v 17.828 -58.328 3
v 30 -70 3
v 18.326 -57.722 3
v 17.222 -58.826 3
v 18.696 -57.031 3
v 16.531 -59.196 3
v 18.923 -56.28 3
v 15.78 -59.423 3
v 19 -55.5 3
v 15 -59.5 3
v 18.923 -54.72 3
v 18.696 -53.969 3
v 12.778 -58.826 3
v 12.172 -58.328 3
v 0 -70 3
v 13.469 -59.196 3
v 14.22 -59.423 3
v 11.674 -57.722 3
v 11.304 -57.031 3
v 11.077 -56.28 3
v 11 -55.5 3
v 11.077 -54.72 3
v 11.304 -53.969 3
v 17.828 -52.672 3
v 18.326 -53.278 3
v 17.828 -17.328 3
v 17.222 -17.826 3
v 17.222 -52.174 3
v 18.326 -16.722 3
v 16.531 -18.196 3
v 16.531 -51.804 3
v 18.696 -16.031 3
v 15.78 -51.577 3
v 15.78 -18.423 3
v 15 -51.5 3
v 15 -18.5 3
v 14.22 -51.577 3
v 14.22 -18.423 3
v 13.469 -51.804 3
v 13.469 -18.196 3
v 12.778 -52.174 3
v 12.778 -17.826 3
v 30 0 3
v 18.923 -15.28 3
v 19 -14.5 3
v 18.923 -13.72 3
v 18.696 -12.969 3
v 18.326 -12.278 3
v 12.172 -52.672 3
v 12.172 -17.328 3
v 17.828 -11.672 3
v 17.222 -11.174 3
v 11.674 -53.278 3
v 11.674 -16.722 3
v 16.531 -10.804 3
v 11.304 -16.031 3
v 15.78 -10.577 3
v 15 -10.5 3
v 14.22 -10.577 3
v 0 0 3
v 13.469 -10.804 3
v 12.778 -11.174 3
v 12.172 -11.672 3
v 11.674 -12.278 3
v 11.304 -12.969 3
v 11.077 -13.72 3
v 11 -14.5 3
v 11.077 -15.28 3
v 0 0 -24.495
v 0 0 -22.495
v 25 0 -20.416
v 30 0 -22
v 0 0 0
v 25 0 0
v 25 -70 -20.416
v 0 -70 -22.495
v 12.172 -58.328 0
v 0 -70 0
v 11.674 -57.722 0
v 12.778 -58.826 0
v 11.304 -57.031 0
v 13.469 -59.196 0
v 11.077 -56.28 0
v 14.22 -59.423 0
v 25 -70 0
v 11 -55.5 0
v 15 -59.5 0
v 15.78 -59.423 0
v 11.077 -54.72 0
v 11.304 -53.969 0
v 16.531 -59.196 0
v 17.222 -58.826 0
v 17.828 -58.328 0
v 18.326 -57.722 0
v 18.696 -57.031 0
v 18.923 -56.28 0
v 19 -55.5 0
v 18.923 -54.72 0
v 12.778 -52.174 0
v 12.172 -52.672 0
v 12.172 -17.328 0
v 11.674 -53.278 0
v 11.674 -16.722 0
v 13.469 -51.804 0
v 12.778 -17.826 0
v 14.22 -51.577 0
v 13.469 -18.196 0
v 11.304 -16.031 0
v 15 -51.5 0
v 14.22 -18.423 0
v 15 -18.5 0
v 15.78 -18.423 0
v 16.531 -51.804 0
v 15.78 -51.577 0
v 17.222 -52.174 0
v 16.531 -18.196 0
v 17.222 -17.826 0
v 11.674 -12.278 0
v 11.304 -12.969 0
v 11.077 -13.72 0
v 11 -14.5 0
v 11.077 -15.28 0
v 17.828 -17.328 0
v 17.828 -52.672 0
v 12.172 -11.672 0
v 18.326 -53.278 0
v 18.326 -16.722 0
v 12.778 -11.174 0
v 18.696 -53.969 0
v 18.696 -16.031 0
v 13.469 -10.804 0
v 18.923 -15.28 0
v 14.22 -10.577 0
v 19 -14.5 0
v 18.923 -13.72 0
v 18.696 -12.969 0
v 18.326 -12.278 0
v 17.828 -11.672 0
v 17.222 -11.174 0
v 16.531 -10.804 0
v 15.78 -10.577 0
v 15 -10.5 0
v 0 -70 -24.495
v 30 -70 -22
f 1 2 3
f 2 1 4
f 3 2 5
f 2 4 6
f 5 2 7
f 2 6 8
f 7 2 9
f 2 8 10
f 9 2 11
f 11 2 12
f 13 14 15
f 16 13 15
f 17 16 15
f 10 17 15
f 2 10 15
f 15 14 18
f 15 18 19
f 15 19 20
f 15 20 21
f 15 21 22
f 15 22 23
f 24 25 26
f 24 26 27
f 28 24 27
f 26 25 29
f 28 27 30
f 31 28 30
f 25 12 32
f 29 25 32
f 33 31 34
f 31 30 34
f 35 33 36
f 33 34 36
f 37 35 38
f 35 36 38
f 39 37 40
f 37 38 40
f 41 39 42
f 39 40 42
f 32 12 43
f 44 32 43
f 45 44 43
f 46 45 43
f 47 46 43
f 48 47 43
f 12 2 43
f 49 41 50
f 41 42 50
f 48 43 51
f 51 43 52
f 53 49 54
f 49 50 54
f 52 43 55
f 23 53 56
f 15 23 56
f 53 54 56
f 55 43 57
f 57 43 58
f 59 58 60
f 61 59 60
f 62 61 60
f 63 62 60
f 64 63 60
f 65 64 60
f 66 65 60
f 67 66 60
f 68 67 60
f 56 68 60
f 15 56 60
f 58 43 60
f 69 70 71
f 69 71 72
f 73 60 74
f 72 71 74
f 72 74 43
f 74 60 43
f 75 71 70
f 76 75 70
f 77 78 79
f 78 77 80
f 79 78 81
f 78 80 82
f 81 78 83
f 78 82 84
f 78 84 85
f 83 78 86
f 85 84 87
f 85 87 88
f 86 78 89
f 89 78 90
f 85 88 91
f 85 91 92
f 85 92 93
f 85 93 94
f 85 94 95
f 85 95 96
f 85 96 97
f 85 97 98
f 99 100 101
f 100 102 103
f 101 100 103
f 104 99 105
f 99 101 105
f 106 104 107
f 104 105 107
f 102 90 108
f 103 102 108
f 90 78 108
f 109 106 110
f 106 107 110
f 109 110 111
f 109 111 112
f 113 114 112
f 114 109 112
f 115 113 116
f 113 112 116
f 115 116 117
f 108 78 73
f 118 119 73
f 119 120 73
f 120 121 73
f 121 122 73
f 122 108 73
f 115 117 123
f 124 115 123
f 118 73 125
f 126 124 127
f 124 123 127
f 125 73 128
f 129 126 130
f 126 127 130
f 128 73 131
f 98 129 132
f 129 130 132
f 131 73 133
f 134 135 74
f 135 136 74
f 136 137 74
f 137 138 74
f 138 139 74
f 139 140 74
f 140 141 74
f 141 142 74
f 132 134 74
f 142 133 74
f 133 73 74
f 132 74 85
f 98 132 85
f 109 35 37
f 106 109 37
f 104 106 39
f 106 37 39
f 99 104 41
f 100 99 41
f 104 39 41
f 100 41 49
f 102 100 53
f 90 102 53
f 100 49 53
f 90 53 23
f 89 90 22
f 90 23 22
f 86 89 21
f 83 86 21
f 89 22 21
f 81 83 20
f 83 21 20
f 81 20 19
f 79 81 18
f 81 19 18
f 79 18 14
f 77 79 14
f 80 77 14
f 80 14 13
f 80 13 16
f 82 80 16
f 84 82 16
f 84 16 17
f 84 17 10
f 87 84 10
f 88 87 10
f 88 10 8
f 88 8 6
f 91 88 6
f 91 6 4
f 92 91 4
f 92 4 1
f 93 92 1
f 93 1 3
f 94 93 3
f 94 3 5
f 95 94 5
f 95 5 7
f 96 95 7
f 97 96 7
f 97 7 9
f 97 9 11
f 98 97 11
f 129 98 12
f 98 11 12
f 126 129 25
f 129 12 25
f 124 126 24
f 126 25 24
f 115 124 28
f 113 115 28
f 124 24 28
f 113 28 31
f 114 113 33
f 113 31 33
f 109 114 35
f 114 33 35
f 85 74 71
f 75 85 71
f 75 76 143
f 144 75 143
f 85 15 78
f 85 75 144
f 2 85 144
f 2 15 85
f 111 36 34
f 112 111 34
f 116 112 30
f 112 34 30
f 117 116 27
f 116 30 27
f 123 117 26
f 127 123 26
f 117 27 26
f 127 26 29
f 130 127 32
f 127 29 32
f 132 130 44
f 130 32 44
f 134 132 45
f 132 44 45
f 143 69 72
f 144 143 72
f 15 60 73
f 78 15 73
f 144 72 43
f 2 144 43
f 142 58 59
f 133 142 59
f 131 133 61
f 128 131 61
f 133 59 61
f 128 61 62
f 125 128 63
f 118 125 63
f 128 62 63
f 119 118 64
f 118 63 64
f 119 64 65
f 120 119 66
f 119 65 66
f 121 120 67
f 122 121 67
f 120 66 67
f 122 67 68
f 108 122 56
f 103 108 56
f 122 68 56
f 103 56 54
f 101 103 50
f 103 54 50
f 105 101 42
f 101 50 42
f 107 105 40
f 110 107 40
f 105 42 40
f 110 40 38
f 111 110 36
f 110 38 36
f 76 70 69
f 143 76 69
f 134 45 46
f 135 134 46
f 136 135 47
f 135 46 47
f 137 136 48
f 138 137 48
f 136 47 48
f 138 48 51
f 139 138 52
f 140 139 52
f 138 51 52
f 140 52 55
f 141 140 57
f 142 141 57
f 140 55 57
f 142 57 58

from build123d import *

# Parameters (mm, degrees)
F1_DEPTH = 70
F3_DEPTH = 5


with BuildPart() as f1:
    # F0 (on Front) → F1 (new body)
    with BuildSketch(Plane.XZ):
        Polygon((0, 3), (0, 0), (25, 0), (25, -20.415811), (25, -22.415811), (30, -22), (30, 3), align=None)
        Polygon((25, -22.415811), (25, -20.415811), (0, -22.494866), (0, -24.494866), align=None)
    extrude(amount=F1_DEPTH)

    # F2 (on face) → F3 (cut)
    with BuildSketch(Plane.XY.offset(3)):
        with BuildLine():
            ThreePointArc((19, -14.5), (17.828427, -11.671573), (15, -10.5))
            Line((15, -10.5), (15, -14.5))
            Line((15, -14.5), (15, -18.5))
            ThreePointArc((15, -18.5), (17.828427, -17.328427), (19, -14.5))
        make_face()
        with BuildLine():
            ThreePointArc((19, -55.5), (17.828427, -52.671573), (15, -51.5))
            ThreePointArc((15, -51.5), (12.171573, -58.328427), (19, -55.5))
        make_face()
        with BuildLine():
            Line((15, -14.5), (15, -10.5))
            ThreePointArc((15, -10.5), (11, -14.5), (15, -18.5))
            Line((15, -18.5), (15, -14.5))
        make_face()
    extrude(amount=-F3_DEPTH, mode=Mode.SUBTRACT)


solid = f1.part
